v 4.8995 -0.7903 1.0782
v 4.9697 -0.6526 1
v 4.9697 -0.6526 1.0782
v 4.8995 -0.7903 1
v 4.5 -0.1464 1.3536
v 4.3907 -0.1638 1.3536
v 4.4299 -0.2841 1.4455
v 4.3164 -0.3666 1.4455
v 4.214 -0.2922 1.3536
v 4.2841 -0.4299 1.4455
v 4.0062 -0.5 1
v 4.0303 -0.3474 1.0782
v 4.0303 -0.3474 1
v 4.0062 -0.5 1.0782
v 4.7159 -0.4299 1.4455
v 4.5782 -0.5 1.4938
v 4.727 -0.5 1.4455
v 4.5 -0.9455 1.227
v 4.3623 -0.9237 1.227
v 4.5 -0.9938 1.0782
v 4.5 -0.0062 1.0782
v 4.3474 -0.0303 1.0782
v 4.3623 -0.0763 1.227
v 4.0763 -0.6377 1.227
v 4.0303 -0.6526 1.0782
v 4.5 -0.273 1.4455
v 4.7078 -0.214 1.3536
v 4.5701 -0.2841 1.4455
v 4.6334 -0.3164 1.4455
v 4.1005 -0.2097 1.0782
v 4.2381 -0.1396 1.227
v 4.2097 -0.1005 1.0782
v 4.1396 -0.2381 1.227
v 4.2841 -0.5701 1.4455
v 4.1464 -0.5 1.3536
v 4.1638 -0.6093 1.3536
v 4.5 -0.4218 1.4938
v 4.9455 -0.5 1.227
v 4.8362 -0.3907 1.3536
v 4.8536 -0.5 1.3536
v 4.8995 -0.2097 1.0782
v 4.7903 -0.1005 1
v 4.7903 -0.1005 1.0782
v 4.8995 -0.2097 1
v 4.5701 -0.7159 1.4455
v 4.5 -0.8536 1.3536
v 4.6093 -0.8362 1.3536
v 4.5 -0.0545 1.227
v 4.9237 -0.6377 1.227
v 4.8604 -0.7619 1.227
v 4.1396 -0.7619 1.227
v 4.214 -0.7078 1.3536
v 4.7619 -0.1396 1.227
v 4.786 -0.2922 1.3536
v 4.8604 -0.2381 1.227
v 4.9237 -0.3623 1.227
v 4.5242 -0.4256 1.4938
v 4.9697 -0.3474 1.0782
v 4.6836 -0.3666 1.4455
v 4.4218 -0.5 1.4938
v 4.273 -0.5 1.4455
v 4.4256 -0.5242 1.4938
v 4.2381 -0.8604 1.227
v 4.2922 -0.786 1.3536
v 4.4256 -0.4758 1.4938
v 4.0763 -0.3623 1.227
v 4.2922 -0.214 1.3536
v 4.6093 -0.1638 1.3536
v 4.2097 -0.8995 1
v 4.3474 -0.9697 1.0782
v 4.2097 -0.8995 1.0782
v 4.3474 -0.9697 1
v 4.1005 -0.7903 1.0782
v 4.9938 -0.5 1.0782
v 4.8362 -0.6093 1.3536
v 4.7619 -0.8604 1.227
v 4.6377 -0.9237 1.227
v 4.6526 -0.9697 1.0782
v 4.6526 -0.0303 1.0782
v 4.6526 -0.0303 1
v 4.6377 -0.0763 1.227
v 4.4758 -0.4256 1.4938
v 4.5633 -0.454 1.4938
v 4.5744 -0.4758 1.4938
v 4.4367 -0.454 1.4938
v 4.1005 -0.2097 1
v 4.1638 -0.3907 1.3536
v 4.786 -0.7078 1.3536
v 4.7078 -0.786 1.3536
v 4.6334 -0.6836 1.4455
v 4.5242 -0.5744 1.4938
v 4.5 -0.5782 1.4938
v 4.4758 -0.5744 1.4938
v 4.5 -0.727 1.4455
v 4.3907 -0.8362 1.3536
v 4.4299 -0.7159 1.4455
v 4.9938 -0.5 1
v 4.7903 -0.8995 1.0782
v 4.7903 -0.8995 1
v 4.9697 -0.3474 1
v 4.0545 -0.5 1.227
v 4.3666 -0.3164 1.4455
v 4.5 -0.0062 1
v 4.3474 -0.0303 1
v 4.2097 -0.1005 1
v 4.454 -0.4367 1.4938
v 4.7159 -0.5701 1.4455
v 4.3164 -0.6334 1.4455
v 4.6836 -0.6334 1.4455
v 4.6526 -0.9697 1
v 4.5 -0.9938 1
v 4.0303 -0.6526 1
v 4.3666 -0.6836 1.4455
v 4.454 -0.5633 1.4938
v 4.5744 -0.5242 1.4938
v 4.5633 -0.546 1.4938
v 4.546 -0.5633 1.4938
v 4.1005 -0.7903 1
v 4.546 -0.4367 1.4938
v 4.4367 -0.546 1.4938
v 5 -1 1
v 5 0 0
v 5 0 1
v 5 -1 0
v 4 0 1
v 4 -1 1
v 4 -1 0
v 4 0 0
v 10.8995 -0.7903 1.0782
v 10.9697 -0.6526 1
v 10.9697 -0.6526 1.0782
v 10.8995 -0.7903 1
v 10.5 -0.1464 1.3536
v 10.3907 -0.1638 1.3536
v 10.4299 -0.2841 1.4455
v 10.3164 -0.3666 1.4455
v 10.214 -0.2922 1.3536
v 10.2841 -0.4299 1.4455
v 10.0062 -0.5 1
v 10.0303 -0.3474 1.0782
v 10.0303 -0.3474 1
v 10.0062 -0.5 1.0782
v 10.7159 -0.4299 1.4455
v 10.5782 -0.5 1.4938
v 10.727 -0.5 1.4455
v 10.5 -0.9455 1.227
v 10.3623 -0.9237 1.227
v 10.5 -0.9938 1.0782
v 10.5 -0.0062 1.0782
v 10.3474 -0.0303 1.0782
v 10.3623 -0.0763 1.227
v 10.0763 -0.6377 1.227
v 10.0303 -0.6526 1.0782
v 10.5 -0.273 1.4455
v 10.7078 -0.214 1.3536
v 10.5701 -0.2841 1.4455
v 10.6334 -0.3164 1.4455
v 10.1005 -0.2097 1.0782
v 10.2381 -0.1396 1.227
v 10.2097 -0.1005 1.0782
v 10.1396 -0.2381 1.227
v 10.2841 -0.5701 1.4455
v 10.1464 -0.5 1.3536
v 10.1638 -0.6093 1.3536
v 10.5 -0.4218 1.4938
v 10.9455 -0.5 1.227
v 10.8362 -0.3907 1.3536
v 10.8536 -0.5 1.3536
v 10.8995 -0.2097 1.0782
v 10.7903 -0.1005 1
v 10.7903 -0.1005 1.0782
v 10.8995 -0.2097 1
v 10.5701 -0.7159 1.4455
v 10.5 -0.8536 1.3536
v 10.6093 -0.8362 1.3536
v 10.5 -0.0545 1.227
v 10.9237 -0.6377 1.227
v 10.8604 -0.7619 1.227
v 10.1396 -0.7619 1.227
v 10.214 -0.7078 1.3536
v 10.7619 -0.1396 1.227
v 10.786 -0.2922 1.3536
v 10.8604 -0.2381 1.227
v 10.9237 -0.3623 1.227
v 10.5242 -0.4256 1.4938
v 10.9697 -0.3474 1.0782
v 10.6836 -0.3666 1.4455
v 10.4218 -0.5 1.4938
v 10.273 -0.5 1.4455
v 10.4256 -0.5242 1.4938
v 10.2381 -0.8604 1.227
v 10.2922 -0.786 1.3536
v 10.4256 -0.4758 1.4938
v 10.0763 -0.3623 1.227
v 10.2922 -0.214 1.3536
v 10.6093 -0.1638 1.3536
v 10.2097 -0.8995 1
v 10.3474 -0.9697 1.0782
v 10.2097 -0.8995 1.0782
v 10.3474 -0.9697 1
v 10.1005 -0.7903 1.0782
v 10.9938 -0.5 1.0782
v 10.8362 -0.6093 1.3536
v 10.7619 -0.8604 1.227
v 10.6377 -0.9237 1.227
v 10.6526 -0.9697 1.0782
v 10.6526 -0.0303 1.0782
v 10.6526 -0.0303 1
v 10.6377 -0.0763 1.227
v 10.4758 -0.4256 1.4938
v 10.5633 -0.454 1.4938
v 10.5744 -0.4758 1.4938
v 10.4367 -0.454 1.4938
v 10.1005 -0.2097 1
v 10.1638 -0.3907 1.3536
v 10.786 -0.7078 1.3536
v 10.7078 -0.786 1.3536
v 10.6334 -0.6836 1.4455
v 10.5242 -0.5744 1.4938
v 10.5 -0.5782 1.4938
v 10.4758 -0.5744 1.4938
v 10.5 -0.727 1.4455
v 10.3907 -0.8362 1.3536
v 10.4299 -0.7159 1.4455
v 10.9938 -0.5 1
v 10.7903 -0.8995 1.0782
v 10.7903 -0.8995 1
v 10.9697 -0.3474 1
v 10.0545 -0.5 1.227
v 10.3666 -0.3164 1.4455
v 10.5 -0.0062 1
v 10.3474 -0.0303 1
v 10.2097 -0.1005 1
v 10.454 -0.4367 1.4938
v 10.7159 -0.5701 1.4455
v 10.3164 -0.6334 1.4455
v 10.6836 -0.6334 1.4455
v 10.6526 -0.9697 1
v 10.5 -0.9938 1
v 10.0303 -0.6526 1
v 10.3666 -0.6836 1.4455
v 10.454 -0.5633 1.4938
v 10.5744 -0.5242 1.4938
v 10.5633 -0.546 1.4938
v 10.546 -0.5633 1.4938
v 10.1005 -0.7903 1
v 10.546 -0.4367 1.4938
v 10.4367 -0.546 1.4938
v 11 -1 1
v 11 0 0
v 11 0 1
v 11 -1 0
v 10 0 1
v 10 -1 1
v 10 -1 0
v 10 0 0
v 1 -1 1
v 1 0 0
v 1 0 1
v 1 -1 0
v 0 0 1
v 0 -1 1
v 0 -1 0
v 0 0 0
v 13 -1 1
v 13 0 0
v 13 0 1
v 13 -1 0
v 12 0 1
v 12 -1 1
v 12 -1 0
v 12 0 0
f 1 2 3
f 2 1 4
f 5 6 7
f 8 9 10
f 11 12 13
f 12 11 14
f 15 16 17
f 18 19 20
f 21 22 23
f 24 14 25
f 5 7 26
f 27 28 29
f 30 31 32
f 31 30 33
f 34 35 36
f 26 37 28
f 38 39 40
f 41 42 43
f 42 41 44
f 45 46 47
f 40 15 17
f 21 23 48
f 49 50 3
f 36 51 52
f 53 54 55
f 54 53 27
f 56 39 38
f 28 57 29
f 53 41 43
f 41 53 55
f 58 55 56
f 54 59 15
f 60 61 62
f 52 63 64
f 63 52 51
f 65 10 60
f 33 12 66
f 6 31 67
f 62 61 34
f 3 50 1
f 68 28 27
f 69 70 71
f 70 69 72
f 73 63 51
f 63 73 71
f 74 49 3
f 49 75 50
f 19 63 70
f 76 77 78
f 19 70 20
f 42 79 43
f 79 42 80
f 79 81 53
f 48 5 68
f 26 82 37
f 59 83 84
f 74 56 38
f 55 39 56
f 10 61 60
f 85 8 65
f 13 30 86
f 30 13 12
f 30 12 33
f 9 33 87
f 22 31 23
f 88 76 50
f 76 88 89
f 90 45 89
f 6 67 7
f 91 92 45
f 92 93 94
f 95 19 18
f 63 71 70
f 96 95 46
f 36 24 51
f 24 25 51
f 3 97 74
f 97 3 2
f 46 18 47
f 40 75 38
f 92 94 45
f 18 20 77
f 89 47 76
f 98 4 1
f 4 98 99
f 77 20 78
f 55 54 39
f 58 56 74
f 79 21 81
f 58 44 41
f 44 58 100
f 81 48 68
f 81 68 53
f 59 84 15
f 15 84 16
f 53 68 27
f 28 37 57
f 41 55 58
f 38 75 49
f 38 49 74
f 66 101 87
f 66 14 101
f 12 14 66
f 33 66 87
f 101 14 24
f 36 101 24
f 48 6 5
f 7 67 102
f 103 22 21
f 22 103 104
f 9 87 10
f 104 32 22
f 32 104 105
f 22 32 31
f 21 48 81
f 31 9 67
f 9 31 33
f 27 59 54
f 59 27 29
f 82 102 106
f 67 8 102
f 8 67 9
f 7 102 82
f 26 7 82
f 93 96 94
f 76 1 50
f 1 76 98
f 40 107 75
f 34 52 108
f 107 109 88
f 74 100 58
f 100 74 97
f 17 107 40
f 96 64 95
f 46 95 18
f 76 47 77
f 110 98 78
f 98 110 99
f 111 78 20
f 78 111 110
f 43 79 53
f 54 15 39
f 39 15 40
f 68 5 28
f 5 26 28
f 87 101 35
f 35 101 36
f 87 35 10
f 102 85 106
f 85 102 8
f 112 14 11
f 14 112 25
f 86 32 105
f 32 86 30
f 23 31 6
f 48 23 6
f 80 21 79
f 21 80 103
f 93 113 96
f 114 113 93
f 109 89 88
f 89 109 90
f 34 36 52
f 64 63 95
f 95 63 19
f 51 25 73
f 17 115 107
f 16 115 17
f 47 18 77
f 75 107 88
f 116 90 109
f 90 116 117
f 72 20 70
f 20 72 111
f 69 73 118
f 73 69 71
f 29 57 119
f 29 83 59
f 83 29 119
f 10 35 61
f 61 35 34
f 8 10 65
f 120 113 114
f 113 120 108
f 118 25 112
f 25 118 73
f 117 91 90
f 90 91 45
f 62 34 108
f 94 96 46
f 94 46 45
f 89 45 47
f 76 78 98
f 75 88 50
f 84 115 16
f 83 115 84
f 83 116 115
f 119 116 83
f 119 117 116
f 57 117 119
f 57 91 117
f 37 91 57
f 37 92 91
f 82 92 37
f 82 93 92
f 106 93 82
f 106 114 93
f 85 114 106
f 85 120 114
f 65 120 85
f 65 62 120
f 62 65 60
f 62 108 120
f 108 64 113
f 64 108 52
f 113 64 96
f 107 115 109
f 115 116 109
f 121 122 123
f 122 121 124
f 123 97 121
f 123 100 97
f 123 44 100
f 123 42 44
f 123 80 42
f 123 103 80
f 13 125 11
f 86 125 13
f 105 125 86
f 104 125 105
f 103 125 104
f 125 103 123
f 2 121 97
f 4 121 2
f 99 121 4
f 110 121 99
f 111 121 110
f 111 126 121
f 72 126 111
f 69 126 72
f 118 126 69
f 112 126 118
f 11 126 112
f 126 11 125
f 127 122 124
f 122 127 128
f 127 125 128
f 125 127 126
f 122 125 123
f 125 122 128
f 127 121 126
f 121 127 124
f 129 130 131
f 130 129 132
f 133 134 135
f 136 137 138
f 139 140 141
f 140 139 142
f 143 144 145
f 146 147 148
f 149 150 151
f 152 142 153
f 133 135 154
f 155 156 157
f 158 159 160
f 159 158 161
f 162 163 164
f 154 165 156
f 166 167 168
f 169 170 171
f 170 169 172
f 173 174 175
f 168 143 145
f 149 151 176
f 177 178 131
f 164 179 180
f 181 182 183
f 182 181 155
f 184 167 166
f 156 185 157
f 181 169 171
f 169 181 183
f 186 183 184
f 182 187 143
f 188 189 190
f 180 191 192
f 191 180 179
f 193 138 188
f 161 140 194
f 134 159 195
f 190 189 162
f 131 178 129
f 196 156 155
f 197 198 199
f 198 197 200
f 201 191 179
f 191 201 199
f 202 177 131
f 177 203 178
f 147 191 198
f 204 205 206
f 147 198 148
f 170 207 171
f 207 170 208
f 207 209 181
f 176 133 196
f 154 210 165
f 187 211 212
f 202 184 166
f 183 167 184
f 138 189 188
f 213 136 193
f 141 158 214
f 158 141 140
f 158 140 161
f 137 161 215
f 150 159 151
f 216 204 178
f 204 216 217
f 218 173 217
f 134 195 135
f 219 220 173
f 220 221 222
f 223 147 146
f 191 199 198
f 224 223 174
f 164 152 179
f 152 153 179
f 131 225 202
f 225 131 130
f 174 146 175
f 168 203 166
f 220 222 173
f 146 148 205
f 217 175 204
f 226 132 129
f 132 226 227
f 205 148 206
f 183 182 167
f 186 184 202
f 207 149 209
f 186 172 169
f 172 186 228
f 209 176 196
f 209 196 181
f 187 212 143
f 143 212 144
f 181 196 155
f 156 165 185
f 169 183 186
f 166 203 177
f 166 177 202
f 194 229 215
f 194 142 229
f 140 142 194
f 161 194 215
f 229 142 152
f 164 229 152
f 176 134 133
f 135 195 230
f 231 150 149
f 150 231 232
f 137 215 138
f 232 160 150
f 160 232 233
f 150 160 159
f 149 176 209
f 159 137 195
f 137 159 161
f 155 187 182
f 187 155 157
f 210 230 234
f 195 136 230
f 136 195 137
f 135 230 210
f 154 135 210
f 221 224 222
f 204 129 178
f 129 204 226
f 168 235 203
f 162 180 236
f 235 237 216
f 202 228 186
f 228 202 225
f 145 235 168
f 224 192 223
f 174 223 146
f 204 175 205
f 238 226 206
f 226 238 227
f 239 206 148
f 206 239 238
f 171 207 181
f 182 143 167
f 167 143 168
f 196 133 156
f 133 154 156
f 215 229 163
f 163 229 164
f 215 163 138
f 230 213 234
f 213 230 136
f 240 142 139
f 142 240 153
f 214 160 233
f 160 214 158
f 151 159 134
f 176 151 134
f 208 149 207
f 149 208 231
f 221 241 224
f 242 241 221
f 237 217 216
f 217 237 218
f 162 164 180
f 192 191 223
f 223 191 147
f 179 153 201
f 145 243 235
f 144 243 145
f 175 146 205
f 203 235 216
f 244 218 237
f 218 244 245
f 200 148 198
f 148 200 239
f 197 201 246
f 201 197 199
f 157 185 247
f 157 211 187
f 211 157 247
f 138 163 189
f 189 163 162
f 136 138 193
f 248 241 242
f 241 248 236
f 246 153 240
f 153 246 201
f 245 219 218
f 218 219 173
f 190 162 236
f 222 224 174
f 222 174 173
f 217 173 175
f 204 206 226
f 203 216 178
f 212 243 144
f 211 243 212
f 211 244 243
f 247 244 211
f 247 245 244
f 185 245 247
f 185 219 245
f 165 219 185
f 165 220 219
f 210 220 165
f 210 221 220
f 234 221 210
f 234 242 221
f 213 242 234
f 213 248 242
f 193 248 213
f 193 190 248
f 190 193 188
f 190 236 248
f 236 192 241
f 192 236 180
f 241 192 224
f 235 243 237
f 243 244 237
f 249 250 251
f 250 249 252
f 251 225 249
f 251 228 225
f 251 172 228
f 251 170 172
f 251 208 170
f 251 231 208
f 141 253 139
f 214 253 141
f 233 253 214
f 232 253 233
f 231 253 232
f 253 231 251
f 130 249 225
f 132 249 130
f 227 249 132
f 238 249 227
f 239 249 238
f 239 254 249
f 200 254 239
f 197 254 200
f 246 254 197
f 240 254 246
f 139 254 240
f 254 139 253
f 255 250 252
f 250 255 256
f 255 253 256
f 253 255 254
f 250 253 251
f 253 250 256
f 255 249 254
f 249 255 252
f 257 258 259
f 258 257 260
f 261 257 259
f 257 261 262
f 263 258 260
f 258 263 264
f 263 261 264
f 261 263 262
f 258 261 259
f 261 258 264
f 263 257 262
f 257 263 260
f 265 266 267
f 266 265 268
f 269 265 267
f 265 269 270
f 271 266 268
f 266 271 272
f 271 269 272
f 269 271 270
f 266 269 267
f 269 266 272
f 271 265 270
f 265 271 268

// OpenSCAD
module house(roof="flat",paint=[1,0,0]){
  color(paint)
  if(roof=="flat"){
    translate([0,-1,0])
    cube();
  } else if(roof=="pitched"){
    rotate([90,0,0])
   	//linear_extrude(height=1)
    polygon(points=[[0,0],[0,1],[0.5,1.5],[1,1],[1,0]],paths=[ [0,1,2,3,4] ]);
  } else if(roof=="domical"){
    translate([0,-1,0])
    union(){
      translate([0.5,0.5,1]) sphere(r=0.5,$fn=20);
      cube();   
    }
  }
}

union(){
  house();
  translate([2,0,0]) house("pitched");
  translate([4,0,0]) house("domical",[0,1,0]);
  translate([6,0,0]) house(roof="pitched",paint=[0,0,1]);
  translate([8,0,0]) house(paint=[0,0,0],roof="pitched");
  translate([10,0,0]) house(roof="domical");
  translate([12,0,0]) house(paint=[0,0.5,0.5]);
}
